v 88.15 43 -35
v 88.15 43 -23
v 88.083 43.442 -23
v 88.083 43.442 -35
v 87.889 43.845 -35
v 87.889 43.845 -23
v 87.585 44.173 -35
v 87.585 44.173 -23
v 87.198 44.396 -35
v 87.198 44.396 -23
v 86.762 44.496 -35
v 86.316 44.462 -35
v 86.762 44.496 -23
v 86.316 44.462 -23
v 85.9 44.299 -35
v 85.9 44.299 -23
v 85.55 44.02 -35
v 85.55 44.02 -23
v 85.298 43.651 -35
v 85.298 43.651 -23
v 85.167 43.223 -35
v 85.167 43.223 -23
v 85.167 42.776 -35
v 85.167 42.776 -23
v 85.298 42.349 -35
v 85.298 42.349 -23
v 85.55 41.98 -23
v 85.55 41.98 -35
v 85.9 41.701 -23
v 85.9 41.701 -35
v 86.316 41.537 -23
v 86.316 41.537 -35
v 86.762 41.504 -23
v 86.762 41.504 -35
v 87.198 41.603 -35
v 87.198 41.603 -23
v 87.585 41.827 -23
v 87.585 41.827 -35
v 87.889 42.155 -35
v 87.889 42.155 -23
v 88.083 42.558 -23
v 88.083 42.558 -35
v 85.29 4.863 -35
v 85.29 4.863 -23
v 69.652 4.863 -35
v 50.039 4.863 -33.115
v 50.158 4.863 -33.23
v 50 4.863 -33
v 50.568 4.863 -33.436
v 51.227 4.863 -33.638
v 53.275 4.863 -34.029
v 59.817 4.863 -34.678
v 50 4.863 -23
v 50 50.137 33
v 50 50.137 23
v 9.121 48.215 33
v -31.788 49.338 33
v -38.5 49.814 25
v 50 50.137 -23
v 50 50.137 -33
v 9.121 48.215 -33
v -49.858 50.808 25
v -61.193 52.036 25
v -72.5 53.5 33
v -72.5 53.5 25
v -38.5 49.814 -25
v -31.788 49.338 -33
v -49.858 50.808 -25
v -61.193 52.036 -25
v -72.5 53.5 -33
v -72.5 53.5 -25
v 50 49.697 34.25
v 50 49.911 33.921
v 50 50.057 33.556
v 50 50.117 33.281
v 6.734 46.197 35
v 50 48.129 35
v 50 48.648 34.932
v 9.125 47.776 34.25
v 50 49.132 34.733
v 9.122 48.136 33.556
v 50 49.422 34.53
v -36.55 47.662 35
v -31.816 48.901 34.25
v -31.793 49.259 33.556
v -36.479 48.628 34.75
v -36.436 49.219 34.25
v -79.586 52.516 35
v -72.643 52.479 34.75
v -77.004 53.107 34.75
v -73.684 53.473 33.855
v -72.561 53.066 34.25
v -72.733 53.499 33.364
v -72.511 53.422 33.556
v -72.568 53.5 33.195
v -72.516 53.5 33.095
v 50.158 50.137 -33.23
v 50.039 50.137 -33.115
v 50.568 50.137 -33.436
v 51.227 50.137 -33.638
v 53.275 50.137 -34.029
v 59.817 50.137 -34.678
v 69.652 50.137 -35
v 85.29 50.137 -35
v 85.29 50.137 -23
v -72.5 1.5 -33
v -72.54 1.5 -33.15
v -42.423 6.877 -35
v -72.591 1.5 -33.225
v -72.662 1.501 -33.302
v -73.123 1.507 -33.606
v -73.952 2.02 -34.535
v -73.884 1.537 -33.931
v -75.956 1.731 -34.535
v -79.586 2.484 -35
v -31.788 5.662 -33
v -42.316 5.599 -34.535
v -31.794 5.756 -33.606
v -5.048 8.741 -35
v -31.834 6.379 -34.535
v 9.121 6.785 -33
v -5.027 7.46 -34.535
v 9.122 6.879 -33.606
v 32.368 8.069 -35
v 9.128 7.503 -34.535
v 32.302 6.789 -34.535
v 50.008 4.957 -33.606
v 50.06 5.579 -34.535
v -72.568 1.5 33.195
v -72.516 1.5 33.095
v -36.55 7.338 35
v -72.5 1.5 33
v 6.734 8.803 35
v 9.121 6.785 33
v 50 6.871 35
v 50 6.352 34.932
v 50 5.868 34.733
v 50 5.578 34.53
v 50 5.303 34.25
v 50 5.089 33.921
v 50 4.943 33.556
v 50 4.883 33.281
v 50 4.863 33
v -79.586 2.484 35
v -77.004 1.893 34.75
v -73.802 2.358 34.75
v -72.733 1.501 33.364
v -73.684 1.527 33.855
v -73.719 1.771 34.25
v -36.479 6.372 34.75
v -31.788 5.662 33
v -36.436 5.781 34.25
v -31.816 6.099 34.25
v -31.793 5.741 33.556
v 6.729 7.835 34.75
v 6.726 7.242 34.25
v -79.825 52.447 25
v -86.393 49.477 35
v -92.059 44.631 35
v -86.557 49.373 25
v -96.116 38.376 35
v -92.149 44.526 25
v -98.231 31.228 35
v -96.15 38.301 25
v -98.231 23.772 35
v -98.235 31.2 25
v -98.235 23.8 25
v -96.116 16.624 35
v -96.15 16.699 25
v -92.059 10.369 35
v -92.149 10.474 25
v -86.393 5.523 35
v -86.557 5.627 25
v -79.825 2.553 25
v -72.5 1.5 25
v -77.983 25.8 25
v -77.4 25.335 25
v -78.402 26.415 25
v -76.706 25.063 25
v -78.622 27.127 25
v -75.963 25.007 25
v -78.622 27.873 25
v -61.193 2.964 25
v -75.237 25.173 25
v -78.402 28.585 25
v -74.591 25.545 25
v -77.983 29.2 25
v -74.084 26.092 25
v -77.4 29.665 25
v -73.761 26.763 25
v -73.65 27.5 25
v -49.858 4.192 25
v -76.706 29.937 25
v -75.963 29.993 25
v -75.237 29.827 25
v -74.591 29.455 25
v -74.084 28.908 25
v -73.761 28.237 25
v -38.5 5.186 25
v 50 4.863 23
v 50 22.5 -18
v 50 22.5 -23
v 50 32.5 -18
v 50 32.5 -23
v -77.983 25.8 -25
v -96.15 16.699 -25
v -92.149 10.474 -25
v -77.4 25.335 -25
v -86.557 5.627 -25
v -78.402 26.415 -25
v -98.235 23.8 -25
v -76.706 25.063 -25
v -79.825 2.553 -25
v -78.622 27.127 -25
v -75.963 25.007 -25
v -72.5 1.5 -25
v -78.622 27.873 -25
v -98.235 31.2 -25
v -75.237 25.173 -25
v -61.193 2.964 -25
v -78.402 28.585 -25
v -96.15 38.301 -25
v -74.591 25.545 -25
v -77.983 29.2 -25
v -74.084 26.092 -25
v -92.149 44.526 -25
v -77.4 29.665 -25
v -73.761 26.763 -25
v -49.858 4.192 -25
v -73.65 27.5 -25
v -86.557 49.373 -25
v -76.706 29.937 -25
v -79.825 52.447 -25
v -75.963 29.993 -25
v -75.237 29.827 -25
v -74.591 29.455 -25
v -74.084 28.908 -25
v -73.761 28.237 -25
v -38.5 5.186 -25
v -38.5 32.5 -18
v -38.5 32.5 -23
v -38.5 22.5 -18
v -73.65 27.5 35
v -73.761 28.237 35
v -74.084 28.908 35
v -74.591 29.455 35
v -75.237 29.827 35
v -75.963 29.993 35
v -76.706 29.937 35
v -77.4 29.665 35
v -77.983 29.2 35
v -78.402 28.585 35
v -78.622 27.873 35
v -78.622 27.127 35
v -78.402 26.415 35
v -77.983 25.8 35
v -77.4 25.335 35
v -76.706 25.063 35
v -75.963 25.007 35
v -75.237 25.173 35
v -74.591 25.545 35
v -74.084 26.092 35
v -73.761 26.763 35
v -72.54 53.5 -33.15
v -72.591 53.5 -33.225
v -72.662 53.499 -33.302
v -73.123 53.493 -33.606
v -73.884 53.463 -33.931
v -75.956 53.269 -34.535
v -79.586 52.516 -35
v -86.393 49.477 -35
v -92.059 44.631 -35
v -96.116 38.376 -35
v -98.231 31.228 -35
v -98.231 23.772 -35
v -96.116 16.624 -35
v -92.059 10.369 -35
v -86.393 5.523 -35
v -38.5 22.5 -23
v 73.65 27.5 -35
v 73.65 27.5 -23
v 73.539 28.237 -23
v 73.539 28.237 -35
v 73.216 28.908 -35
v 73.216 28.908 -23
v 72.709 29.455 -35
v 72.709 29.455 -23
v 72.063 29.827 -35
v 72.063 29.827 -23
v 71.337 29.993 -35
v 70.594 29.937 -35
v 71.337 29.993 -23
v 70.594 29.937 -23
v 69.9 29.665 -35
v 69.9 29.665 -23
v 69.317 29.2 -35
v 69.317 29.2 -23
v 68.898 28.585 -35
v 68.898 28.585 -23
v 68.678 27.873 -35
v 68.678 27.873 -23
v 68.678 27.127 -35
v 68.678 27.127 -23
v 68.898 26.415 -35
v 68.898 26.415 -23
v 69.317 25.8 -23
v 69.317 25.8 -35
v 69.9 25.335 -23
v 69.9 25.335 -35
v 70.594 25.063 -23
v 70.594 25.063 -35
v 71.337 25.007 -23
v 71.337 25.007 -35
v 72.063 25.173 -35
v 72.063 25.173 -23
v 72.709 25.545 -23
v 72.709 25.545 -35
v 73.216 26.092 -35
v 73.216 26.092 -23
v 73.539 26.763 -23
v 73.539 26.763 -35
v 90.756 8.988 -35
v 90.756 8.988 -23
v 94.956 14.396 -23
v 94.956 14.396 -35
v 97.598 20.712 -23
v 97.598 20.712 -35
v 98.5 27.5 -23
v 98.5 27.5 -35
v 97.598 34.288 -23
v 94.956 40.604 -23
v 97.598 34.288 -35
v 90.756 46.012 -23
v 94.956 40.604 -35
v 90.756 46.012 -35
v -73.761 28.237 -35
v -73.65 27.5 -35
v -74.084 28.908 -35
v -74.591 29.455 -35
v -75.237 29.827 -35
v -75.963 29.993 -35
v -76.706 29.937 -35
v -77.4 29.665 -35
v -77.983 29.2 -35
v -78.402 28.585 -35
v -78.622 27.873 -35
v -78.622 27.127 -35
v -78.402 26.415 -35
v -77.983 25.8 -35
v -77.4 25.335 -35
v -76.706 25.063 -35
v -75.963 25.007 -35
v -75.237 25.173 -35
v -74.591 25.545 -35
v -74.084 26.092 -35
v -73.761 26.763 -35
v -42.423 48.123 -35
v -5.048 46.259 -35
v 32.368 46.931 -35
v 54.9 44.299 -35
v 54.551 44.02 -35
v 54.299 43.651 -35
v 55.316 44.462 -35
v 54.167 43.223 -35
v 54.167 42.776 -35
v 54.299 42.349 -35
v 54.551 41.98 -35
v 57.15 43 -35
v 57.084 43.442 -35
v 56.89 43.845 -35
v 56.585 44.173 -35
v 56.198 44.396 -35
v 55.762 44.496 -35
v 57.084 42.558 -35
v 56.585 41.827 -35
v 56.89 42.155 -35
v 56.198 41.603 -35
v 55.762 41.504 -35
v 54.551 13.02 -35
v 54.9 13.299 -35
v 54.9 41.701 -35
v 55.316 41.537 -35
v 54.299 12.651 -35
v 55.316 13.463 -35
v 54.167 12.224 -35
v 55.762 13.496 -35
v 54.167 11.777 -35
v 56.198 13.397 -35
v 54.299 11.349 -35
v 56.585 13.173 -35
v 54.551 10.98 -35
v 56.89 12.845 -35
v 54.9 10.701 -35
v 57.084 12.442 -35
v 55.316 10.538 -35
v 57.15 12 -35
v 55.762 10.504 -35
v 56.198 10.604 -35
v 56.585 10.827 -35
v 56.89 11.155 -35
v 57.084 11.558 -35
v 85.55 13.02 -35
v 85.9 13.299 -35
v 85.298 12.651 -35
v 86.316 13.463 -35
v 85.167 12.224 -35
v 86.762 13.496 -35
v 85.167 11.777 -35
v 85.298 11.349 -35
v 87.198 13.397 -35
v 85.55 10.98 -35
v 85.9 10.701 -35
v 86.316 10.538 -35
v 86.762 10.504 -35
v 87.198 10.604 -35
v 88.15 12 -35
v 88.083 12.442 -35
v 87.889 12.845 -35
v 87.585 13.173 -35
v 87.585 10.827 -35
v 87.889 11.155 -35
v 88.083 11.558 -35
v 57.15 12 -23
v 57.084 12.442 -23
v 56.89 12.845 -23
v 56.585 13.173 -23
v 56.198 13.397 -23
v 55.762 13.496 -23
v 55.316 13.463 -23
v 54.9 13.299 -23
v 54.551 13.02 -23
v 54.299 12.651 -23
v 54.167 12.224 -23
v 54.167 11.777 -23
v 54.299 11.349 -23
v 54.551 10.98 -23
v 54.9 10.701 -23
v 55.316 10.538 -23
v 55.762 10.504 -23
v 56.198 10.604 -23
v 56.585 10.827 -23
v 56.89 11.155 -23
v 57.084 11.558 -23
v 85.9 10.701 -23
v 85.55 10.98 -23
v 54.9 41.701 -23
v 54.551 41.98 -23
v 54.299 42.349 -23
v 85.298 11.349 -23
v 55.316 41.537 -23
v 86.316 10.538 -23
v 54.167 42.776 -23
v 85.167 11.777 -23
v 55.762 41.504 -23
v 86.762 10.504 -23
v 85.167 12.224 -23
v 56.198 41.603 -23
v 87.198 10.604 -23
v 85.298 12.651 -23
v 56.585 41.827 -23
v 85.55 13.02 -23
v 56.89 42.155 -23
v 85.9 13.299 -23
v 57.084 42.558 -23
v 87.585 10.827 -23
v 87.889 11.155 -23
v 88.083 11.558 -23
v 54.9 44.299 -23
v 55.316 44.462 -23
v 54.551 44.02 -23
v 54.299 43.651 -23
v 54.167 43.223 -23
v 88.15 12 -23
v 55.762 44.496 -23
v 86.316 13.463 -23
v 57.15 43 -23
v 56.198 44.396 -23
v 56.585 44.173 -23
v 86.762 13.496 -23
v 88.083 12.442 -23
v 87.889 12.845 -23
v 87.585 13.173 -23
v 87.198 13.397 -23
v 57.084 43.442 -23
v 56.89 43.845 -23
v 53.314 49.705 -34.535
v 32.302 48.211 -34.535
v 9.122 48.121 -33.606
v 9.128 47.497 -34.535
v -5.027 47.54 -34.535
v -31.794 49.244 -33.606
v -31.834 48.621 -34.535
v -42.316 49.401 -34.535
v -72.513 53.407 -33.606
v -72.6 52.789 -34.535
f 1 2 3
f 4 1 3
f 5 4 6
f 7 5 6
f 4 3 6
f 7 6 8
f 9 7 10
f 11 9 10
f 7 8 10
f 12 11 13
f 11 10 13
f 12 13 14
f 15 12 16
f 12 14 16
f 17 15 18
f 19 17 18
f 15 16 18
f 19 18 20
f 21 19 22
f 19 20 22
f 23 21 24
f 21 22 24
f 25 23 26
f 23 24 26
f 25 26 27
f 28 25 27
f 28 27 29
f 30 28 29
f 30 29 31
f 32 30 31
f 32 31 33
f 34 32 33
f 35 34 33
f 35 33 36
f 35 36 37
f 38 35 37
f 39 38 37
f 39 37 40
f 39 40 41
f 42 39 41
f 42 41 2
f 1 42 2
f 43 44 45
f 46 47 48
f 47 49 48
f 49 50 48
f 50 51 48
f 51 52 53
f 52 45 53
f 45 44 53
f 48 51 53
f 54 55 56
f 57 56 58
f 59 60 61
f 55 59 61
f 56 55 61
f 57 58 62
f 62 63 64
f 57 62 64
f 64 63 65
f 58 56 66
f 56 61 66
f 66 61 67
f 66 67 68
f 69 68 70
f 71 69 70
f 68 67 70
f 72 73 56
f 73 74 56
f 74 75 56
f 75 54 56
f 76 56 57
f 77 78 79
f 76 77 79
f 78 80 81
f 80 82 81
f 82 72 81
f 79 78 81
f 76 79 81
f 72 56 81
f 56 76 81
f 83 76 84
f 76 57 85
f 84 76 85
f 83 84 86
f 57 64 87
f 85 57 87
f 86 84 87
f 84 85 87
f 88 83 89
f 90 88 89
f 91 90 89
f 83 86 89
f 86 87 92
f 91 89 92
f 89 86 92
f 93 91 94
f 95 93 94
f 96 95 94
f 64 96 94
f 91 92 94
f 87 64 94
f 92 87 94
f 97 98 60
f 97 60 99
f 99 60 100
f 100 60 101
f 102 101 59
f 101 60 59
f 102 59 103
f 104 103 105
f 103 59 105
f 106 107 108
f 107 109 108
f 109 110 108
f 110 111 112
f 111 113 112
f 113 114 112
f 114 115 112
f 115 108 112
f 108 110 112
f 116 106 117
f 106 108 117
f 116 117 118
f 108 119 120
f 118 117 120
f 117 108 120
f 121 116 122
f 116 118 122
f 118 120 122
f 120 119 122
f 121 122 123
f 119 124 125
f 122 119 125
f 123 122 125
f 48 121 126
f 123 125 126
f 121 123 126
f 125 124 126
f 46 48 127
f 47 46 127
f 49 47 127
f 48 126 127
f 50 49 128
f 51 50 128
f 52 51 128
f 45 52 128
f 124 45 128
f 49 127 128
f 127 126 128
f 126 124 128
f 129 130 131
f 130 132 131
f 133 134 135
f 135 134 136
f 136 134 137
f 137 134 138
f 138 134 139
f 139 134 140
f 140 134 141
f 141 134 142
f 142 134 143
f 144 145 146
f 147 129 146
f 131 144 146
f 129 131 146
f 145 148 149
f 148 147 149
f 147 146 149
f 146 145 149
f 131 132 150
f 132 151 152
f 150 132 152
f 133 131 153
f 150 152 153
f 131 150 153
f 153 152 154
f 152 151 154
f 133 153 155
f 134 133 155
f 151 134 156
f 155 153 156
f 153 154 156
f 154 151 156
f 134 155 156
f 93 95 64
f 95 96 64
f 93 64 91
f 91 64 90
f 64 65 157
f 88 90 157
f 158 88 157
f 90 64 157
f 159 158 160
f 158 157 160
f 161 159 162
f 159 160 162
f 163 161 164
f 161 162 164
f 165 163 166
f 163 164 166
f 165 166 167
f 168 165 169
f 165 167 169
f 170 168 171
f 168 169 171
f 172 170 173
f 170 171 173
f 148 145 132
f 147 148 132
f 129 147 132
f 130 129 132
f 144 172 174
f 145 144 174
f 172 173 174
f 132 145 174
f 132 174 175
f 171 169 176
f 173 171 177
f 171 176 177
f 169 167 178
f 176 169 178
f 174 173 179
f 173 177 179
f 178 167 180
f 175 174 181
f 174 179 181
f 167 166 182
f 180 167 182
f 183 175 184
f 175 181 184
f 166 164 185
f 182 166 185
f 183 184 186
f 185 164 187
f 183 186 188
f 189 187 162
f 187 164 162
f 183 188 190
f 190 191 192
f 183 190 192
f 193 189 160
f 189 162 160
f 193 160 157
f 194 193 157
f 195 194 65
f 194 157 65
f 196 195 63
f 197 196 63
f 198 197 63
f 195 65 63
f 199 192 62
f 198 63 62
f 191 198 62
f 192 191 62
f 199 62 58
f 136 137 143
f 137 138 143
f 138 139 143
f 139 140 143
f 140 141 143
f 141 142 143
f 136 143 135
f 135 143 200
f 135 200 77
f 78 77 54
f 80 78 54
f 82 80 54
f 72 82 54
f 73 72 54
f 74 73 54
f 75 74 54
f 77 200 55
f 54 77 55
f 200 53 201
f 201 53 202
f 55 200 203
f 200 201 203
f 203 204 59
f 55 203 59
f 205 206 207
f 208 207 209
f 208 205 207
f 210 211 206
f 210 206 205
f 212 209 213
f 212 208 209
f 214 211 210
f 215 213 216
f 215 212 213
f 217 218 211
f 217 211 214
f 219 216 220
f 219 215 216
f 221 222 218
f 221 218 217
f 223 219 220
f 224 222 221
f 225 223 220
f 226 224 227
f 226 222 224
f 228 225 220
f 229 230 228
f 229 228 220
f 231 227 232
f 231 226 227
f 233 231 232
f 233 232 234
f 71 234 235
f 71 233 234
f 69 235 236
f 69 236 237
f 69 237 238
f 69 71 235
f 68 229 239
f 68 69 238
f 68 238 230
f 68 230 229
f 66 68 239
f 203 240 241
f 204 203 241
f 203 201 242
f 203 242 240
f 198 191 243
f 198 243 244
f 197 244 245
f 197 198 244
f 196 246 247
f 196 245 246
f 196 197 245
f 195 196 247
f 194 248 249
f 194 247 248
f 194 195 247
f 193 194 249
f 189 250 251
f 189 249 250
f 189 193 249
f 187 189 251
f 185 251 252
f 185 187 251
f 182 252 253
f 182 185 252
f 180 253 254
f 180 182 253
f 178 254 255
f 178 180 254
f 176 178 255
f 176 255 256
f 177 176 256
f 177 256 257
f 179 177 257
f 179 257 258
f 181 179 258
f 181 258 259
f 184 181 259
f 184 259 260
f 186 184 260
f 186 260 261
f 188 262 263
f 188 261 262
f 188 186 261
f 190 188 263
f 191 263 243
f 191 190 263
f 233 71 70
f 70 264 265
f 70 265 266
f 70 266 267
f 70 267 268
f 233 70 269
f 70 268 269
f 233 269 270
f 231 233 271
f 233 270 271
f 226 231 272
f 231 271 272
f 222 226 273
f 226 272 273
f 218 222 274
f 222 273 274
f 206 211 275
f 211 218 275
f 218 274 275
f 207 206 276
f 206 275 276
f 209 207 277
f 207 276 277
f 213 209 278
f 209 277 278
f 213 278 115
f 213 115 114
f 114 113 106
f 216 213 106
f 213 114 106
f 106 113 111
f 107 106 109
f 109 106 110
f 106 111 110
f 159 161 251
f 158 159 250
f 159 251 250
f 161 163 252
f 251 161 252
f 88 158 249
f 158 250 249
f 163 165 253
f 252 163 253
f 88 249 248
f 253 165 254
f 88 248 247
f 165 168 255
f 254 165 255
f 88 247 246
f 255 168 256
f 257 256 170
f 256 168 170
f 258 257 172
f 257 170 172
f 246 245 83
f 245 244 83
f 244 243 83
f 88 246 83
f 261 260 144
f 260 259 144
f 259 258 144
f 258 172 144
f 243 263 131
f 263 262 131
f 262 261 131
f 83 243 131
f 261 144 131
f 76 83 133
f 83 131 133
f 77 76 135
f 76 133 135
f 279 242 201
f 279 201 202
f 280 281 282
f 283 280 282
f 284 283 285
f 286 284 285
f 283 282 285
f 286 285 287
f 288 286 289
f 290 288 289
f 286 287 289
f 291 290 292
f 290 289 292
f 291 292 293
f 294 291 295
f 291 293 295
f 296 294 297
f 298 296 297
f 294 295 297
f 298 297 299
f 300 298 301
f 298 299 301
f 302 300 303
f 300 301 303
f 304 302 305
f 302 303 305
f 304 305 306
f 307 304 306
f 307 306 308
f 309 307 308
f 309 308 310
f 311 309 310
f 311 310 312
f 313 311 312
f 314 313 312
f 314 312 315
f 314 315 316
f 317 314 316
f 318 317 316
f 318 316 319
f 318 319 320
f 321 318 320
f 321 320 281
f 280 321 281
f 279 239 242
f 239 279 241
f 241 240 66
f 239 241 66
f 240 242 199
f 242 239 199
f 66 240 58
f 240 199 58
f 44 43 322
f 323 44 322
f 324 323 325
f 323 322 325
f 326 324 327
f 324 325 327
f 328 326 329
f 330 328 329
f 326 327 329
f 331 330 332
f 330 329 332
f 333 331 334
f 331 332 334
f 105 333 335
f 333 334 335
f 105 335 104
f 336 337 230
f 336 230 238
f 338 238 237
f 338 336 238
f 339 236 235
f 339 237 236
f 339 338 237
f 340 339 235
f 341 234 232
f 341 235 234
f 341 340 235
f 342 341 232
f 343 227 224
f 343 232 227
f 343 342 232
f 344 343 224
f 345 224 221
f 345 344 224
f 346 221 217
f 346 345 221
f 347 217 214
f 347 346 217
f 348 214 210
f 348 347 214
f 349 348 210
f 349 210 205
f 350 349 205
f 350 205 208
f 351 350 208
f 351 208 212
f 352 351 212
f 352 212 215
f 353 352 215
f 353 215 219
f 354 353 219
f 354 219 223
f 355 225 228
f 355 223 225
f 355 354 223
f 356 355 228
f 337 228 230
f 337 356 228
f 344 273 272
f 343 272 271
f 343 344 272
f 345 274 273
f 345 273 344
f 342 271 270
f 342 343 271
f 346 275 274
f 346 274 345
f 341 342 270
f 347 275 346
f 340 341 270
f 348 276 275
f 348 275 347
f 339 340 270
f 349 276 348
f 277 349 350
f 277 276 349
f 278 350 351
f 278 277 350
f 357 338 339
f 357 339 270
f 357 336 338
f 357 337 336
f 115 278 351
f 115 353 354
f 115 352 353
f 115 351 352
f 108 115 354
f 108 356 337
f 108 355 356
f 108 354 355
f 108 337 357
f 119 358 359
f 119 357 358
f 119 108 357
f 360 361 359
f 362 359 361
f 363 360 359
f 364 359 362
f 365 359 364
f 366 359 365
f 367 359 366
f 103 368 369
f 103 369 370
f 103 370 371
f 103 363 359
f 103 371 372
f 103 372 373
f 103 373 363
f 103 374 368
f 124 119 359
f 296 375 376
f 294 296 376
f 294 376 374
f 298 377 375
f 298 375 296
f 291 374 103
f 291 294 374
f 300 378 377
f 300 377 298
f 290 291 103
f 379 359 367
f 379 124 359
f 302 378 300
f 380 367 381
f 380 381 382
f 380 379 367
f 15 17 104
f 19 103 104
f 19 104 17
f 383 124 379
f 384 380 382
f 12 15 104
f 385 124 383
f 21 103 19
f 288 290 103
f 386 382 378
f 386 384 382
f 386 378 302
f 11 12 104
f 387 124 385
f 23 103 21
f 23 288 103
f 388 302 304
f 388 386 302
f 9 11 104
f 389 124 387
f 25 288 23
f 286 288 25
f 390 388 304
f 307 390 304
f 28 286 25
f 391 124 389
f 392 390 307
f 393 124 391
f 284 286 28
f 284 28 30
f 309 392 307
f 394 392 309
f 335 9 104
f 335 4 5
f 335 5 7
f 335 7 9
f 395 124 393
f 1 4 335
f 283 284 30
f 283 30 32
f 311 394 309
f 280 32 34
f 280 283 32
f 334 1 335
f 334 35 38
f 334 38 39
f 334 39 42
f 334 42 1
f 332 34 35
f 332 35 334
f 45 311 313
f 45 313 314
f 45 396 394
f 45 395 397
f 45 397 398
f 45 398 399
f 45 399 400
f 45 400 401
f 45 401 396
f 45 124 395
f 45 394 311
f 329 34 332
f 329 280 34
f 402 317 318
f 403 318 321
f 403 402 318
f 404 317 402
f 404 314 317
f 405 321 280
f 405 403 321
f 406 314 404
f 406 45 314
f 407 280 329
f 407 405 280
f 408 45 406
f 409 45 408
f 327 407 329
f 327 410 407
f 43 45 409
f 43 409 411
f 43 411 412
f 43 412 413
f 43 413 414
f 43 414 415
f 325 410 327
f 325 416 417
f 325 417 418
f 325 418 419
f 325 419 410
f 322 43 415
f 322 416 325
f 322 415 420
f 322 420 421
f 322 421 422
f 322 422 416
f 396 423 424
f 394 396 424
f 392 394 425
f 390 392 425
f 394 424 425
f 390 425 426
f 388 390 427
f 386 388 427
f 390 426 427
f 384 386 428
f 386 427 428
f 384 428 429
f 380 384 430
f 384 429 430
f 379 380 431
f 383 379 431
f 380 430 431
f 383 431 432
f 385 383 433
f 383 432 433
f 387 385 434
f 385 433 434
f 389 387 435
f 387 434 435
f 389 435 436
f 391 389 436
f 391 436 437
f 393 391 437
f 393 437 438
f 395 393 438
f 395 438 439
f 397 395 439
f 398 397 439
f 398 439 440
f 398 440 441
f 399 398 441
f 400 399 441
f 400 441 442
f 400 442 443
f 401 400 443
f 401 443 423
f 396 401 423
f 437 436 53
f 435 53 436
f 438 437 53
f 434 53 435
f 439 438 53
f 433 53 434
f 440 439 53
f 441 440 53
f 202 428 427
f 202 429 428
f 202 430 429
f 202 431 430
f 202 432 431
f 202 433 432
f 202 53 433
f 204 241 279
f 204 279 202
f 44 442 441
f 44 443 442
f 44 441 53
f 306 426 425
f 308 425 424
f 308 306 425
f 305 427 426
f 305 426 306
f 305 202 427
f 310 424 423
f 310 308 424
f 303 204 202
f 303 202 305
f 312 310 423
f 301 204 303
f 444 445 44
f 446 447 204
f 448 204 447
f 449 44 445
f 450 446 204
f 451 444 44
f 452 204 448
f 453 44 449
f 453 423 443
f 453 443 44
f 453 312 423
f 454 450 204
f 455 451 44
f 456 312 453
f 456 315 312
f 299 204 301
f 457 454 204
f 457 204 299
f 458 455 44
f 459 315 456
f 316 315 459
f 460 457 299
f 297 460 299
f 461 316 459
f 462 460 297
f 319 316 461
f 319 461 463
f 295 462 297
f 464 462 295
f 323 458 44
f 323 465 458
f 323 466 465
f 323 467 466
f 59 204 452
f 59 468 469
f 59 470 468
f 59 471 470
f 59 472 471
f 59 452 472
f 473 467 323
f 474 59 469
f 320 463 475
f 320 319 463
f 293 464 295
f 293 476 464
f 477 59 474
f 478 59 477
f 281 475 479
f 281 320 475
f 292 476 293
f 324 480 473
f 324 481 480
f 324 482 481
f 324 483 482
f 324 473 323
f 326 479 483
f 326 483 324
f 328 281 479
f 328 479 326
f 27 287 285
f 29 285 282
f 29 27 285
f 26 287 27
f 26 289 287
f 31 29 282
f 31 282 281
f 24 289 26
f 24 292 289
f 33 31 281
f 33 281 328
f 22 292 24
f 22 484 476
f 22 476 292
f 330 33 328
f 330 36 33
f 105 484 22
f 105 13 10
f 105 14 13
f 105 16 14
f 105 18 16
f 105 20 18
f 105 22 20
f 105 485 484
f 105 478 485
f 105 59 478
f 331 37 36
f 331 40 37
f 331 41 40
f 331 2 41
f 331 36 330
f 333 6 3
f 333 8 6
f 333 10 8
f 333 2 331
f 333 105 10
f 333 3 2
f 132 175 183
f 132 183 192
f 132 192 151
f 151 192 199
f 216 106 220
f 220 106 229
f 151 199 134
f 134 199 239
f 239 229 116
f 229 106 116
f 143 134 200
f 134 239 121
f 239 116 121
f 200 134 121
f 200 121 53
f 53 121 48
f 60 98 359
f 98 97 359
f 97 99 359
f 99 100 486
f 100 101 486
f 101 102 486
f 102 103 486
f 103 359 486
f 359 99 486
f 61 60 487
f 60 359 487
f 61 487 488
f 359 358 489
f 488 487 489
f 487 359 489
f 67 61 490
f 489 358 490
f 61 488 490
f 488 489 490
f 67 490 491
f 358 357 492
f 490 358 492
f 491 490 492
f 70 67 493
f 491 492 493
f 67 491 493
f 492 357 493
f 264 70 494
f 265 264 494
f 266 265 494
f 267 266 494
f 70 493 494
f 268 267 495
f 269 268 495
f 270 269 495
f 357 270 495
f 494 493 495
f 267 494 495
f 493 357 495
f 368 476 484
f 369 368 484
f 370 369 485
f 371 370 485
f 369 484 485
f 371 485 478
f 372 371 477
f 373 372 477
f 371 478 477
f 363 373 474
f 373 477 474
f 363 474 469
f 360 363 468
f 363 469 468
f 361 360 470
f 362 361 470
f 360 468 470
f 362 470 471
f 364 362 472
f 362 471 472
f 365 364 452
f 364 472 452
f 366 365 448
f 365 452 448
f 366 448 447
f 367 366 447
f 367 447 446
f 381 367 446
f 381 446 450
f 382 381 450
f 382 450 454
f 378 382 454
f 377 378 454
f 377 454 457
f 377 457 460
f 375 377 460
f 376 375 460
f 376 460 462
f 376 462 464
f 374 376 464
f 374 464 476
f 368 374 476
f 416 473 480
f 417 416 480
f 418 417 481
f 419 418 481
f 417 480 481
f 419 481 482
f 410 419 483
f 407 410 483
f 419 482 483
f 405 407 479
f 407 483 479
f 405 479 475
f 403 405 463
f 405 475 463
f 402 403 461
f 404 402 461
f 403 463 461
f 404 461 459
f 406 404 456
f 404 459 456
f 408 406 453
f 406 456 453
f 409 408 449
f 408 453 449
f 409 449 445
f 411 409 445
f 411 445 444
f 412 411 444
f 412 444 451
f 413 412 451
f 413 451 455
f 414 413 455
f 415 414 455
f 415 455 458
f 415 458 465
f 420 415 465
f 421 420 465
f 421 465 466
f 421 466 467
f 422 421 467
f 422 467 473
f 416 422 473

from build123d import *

# Parameters (mm, degrees)
SKETCH1_W               = 200
SKETCH1_H               = 70
BOSS_EXTRUDE1_DEPTH     = 55
SKETCH3_W               = 50
SKETCH3_H               = 55
CUT_EXTRUDE1_DEPTH      = 23
CUT_EXTRUDE2_DEPTH      = 134.88427839
CUT_EXTRUDE2_DEPTH_BACK = 134.88427839
SKETCH4_OUTSIDE_W       = 245.784
SKETCH4_OUTSIDE_H       = 100.784
FILLET2_R               = 2
CUT_EXTRUDE6_DEPTH      = 133.153320217
CUT_EXTRUDE6_DEPTH_BACK = 133.153320217
SKETCH11_R              = 2.5
SKETCH12_W              = 106.420184481
SKETCH12_H              = 81.22852992
CUT_EXTRUDE7_DEPTH      = 25
CUT_EXTRUDE8_DEPTH      = 127.208161551
CUT_EXTRUDE9_DEPTH      = 50
SKETCH15_R              = 2.5
SKETCH15_R_2            = 1.5
CUT_EXTRUDE10_DEPTH     = 50
SKETCH16_W              = 5
SKETCH16_H              = 10
CUT_EXTRUDE11_DEPTH     = 162.677147573


with BuildPart() as part:
    # Sketch1 → Boss-Extrude1 (new body)
    with BuildSketch(Plane(origin=(0, 0, 0), x_dir=(1, 0, 0), z_dir=(0, 1, 0))):
        Rectangle(SKETCH1_W, SKETCH1_H)
    extrude(amount=BOSS_EXTRUDE1_DEPTH)

    # Sketch3 → Cut-Extrude1 (cut, symmetric)
    with BuildSketch(Plane.XY):
        with Locations((75, 27.5)):
            Rectangle(SKETCH3_W, SKETCH3_H)
    extrude(amount=CUT_EXTRUDE1_DEPTH, both=True, mode=Mode.SUBTRACT)

    # Sketch4 outside → Cut-Extrude2 (cut, two sides: drawn at the far end of the back side and taken through both)
    with BuildSketch(Plane.XY.offset(35).offset(-CUT_EXTRUDE2_DEPTH_BACK)):
        with Locations((0, 27.5)):
            Rectangle(SKETCH4_OUTSIDE_W, SKETCH4_OUTSIDE_H)
        with BuildLine():
            ThreePointArc((-72.5, 53.5), (-98.5, 27.5), (-72.5, 1.5))
            ThreePointArc((-72.5, 1.5), (2.267755531, 6.809398073), (77.063073628, 1.90354792))
            ThreePointArc((77.063073628, 1.90354792), (98.5, 27.5), (77.063073628, 53.09645208))
            ThreePointArc((77.063073628, 53.09645208), (2.267755531, 48.190601927), (-72.5, 53.5))
        make_face(mode=Mode.SUBTRACT)
    extrude(amount=CUT_EXTRUDE2_DEPTH + CUT_EXTRUDE2_DEPTH_BACK, mode=Mode.SUBTRACT)

    # Fillet2
    fillet2_edges = [part.edges().sort_by_distance(p)[0] for p in [
        (2.267755531, 48.190601927, -35),
        (2.267755531, 6.809398073, -35),
        (2.267755531, 48.190601927, 35),
        (2.267755531, 6.809398073, 35),
    ]]
    fillet(fillet2_edges, radius=FILLET2_R)

    # Sketch11 → Cut-Extrude6 (cut, two sides: drawn at the far end of the back side and taken through both)
    with BuildSketch(Plane.XY.offset(35).offset(-CUT_EXTRUDE6_DEPTH_BACK)):
        with Locations((-76.15, 27.5)):
            Circle(SKETCH11_R)
    extrude(amount=CUT_EXTRUDE6_DEPTH + CUT_EXTRUDE6_DEPTH_BACK, mode=Mode.SUBTRACT)

    # Sketch12 → Cut-Extrude7 (cut, symmetric)
    with BuildSketch(Plane.XY):
        with Locations((-91.710092241, 25.80773896)):
            Rectangle(SKETCH12_W, SKETCH12_H)
    extrude(amount=CUT_EXTRUDE7_DEPTH, both=True, mode=Mode.SUBTRACT)

    # Sketch13 → Cut-Extrude8 (cut, through all)
    with BuildSketch(Plane(origin=(0, 0, 23), x_dir=(-1, 0, 0), z_dir=(0, 0, -1))):
        with BuildLine():
            Line((-50, 4.863495472), (-50, 50.136504528))
            ThreePointArc((-50, 50.136504528), (-63.549853932, 51.449003205), (-77.063073628, 53.09645208))
            ThreePointArc((-77.063073628, 53.09645208), (-98.5, 27.5), (-77.063073628, 1.90354792))
            ThreePointArc((-77.063073628, 1.90354792), (-63.549853932, 3.550996795), (-50, 4.863495472))
        make_face()
    extrude(amount=-CUT_EXTRUDE8_DEPTH, mode=Mode.SUBTRACT)

    # Sketch14 → Cut-Extrude9 (cut)
    with BuildSketch(Plane.XY.offset(-23)):
        Polygon((50, 4.863495472), (79.442513565, -11.304195271), (157.593662914, 0), (128.462884047, 83.234297684), (50, 50.136504528), (98.5, 50.136504528), (98.5, 4.863495472), align=None)
    extrude(amount=-CUT_EXTRUDE9_DEPTH, mode=Mode.SUBTRACT)

    # Sketch15 → Cut-Extrude10 (cut)
    with BuildSketch(Plane.XY.offset(-23)):
        with Locations((71.15, 27.5)):
            Circle(SKETCH15_R)
        with Locations((55.650219356, 42.999780644)):
            Circle(SKETCH15_R_2)
        with Locations((86.649780644, 42.999780644)):
            Circle(SKETCH15_R_2)
        with Locations((86.649780644, 12.000219356)):
            Circle(SKETCH15_R_2)
        with Locations((55.650219356, 12.000219356)):
            Circle(SKETCH15_R_2)
    extrude(amount=-CUT_EXTRUDE10_DEPTH, mode=Mode.SUBTRACT)

    # Sketch16 → Cut-Extrude11 (cut, through all)
    with BuildSketch(Plane(origin=(50, 0, 0), x_dir=(0, 0, -1), z_dir=(1, 0, 0))):
        with Locations((20.5, 27.5)):
            Rectangle(SKETCH16_W, SKETCH16_H)
    extrude(amount=-CUT_EXTRUDE11_DEPTH, mode=Mode.SUBTRACT)


solid = part.part
